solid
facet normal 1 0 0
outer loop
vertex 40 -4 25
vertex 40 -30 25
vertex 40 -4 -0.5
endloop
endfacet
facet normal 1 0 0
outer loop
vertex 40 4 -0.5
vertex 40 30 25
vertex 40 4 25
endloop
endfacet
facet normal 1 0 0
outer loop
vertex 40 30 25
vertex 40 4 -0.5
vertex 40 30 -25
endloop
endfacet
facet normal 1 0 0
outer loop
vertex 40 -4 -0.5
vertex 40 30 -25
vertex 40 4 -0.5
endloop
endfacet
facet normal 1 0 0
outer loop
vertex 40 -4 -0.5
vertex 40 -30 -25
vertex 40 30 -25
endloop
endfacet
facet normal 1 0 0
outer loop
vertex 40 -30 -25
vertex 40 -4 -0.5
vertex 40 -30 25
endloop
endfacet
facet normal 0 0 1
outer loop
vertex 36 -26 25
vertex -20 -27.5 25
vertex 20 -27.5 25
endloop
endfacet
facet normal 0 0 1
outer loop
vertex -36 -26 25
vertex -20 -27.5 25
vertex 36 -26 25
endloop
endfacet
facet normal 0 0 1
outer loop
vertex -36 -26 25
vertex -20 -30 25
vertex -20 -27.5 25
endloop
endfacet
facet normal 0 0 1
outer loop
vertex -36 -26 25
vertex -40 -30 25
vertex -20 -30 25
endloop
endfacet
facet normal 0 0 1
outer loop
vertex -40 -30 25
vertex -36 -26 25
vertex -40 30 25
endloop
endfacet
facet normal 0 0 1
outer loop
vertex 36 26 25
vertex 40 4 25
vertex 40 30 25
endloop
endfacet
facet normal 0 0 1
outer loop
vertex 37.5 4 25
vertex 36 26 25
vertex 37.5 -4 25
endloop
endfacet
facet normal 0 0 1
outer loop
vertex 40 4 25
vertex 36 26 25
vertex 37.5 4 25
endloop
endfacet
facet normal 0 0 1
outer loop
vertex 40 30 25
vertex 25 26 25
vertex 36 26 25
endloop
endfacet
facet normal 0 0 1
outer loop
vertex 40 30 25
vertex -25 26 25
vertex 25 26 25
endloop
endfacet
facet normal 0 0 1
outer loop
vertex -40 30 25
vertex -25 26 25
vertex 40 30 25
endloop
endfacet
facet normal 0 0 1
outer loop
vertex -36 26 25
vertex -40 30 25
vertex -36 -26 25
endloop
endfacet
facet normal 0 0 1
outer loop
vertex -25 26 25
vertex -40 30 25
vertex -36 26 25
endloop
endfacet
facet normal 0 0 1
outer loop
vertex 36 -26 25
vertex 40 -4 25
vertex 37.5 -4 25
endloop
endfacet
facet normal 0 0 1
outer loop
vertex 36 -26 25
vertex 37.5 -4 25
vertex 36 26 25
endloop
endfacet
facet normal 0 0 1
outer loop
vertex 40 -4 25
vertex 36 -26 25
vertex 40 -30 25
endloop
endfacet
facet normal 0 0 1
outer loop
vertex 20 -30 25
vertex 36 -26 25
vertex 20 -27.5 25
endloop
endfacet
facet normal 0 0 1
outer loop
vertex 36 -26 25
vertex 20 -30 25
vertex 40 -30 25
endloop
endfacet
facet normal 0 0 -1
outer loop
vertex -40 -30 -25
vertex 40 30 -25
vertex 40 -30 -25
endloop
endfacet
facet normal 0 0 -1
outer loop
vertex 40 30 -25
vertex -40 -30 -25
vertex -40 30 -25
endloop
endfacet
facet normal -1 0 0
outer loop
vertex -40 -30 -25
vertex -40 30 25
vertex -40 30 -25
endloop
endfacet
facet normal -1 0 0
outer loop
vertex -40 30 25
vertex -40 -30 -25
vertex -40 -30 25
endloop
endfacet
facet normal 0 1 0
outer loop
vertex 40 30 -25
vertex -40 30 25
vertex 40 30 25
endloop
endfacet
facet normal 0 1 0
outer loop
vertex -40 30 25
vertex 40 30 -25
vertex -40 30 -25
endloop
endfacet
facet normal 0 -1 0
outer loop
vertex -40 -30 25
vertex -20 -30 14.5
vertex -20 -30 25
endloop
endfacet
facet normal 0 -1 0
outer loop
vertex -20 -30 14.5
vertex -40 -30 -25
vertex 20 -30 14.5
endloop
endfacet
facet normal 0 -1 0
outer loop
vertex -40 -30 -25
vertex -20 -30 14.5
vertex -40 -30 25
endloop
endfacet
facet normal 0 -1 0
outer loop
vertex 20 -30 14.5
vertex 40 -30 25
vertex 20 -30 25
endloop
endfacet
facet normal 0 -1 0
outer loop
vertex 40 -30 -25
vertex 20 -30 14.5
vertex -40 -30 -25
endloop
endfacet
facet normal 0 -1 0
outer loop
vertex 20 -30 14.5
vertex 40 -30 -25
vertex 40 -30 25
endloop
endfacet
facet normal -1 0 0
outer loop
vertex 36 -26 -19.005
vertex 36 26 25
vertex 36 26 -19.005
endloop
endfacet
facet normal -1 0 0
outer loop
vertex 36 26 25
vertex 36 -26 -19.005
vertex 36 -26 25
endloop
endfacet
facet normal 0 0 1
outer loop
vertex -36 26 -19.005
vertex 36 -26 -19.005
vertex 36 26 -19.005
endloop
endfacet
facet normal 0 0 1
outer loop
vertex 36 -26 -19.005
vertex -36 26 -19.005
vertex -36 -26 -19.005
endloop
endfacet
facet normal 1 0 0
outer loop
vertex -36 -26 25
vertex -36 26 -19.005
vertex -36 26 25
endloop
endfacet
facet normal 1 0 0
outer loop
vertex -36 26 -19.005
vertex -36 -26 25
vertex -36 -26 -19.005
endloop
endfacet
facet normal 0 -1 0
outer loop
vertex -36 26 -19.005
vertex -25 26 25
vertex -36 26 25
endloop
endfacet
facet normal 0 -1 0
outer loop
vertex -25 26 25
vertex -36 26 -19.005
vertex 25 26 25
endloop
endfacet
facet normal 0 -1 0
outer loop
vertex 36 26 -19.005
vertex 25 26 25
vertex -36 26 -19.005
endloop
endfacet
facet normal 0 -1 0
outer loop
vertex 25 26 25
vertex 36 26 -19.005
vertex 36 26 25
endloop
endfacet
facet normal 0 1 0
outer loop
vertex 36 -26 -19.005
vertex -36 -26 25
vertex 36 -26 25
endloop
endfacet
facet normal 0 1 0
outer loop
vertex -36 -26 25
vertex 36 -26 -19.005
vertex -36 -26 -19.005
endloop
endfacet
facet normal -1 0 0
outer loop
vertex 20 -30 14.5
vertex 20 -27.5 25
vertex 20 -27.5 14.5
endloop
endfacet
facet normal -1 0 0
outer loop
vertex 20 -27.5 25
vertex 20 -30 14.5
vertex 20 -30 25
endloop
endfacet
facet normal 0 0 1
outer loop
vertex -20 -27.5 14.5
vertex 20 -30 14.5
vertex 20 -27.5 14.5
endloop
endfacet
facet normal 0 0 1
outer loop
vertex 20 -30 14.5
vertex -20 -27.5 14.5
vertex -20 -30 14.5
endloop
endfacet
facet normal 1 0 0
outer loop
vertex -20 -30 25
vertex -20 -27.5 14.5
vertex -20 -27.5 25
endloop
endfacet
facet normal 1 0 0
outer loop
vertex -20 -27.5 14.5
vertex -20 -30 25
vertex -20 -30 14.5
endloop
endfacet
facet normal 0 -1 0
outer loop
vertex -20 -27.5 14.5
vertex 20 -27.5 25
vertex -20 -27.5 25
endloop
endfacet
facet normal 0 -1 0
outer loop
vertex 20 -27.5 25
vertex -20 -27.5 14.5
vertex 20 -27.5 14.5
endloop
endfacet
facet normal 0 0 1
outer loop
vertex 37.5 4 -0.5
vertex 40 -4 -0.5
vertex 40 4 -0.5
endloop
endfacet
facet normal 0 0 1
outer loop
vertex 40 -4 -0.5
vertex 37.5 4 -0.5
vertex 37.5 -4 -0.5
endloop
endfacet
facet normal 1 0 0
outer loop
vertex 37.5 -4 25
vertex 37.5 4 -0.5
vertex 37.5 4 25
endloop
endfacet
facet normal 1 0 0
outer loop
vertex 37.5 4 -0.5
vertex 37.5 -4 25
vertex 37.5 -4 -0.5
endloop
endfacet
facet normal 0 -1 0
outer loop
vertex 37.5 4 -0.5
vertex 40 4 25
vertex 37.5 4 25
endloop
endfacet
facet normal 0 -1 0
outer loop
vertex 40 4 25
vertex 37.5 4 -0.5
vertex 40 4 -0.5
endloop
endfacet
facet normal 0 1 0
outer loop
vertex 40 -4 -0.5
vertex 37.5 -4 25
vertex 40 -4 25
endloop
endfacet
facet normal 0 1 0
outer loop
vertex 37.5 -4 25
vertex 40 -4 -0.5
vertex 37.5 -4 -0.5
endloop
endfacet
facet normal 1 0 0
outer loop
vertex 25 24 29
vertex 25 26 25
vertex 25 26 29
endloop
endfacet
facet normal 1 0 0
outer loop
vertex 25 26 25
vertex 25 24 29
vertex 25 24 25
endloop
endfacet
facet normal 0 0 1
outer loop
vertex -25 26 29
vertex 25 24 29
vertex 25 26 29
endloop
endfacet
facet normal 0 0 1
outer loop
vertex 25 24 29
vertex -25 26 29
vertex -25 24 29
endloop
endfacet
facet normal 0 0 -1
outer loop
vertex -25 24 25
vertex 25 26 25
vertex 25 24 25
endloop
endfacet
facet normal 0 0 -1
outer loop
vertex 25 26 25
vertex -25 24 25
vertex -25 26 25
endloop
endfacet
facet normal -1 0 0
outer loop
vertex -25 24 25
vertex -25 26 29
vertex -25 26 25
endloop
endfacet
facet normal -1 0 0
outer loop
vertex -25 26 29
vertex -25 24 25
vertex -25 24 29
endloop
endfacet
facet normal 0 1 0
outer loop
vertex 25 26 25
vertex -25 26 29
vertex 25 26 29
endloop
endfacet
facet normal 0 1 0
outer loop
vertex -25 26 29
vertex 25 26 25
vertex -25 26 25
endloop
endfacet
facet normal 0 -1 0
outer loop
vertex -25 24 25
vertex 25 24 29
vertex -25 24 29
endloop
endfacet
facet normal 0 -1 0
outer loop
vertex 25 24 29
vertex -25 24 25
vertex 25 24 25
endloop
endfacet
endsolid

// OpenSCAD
// Parametric Open-Top Enclosure with Side Openings and Interior Shelf

/* ---- Dimensions ---- */
outer_width   = 80;    // X-axis outer dimension
outer_depth   = 60;    // Y-axis outer dimension
outer_height  = 50;    // Z-axis (bottom to top)
wall_thick    = 4;     // wall thickness
floor_thick   = 4;     // bottom thickness

/* ---- Horizontal Opening (front face, -Y side) ---- */
h_open_w      = 40;    // width (X)
h_open_h      = 10;    // height (Z)
h_open_z_off  = 15;    // distance from bottom to opening lower edge

/* ---- Vertical Opening (right face, +X side) ---- */
v_open_w      = 8;     // width (Y) – horizontal extent on that face
v_open_h      = 30;    // height (Z) – rises from underside

/* ---- Interior Ledge (back face, +Y side) ---- */
ledge_w       = 50;    // width (X)
ledge_t       = 2;     // protrusion into the interior (thin)
ledge_h       = 4;     // vertical thickness
ledge_z_off   = 25;    // height of ledge bottom from floor

$fn = 40;  // smoothness not strictly required, but good practice

// Helper: create hollow box with open top and solid bottom
module hollow_box() {
    difference() {
        // outer solid
        cube([outer_width, outer_depth, outer_height], center = true);
        // inner void (removes material, leaving walls and floor)
        translate([0, 0, floor_thick])
            cube([outer_width - 2*wall_thick,
                  outer_depth - 2*wall_thick,
                  outer_height - floor_thick + 0.01], center = true);
    }
}

// Helper: centered rectangular through-hole on a specified face
// face: "front" (-Y), "right" (+X), "back" (+Y), "left" (-X)
module side_through_hole(face, hole_w, hole_h, hole_dz=0) {
    epsilon = 1;  // small oversize to ensure clean subtraction

    if (face == "front") {
        // hole center placed on Y=-outer_depth/2 plane, centered in X at Z=hole_dz+hole_h/2
        translate([0, -outer_depth/2, hole_dz + hole_h/2])
            cube([hole_w, wall_thick + epsilon, hole_h + epsilon], center = true);
    } else if (face == "back") {
        translate([0, outer_depth/2, hole_dz + hole_h/2])
            cube([hole_w, wall_thick + epsilon, hole_h + epsilon], center = true);
    } else if (face == "right") {
        translate([outer_width/2, 0, hole_dz + hole_h/2])
            cube([wall_thick + epsilon, hole_w, hole_h + epsilon], center = true);
    } else if (face == "left") {
        translate([-outer_width/2, 0, hole_dz + hole_h/2])
            cube([wall_thick + epsilon, hole_w, hole_h + epsilon], center = true);
    }
}

// Main assembly
difference() {
    hollow_box();

    // Horizontal opening on front face
    side_through_hole("front", h_open_w, h_open_h, h_open_z_off);

    // Vertical opening on right face, rising from underside (dz=0 means bottom at floor level)
    // Note: v_open_h is total height, and we want it to start at floor level,
    // so the hole extends from Z=floor_thick (top of floor)? 
    // To simplify, we subtract from Z=0 upward; the hole will also cut the floor edge slightly,
    // which mimics the opening continuing to the very underside.
    side_through_hole("right", v_open_w, v_open_h, 0);
}

// Interior ledge on back wall (+Y side)
// Protrudes inward from inner face of back wall
inner_back_y = outer_depth/2 - wall_thick;   // interior Y coordinate of back wall
ledge_x1 = -ledge_w/2;
ledge_x2 =  ledge_w/2;
ledge_z1 = ledge_z_off;
ledge_z2 = ledge_z_off + ledge_h;

// Solid ledge block: width along X, thickness towards -Y, height along Z
module interior_ledge() {
    translate([0, inner_back_y - ledge_t/2, (ledge_z1 + ledge_z2)/2])
        cube([ledge_w, ledge_t, ledge_h], center = true);
}

// Combine ledge with the holed box
union() {
    // The box (already holed) is implicitly the first object because of the difference above.
    // We wrap the previous difference in a union to add the ledge.
    // OpenSCAD's implicit union handles this when we place the modules sequentially.
    // This is the main model.
    children(); // Actually this would refer to the difference result, but we can't use children that way.
    // Simpler: rewrite everything as a single union with difference inside.
}

// Better approach: place the difference into a module and then union with ledge.
module box_with_holes() {
    difference() {
        hollow_box();
        side_through_hole("front", h_open_w, h_open_h, h_open_z_off);
        side_through_hole("right", v_open_w, v_open_h, 0);
    }
}

// Final model
union() {
    box_with_holes();
    interior_ledge();
}

// The code above ensures manifold geometry. The ledge is attached cleanly to the interior of the back wall.
